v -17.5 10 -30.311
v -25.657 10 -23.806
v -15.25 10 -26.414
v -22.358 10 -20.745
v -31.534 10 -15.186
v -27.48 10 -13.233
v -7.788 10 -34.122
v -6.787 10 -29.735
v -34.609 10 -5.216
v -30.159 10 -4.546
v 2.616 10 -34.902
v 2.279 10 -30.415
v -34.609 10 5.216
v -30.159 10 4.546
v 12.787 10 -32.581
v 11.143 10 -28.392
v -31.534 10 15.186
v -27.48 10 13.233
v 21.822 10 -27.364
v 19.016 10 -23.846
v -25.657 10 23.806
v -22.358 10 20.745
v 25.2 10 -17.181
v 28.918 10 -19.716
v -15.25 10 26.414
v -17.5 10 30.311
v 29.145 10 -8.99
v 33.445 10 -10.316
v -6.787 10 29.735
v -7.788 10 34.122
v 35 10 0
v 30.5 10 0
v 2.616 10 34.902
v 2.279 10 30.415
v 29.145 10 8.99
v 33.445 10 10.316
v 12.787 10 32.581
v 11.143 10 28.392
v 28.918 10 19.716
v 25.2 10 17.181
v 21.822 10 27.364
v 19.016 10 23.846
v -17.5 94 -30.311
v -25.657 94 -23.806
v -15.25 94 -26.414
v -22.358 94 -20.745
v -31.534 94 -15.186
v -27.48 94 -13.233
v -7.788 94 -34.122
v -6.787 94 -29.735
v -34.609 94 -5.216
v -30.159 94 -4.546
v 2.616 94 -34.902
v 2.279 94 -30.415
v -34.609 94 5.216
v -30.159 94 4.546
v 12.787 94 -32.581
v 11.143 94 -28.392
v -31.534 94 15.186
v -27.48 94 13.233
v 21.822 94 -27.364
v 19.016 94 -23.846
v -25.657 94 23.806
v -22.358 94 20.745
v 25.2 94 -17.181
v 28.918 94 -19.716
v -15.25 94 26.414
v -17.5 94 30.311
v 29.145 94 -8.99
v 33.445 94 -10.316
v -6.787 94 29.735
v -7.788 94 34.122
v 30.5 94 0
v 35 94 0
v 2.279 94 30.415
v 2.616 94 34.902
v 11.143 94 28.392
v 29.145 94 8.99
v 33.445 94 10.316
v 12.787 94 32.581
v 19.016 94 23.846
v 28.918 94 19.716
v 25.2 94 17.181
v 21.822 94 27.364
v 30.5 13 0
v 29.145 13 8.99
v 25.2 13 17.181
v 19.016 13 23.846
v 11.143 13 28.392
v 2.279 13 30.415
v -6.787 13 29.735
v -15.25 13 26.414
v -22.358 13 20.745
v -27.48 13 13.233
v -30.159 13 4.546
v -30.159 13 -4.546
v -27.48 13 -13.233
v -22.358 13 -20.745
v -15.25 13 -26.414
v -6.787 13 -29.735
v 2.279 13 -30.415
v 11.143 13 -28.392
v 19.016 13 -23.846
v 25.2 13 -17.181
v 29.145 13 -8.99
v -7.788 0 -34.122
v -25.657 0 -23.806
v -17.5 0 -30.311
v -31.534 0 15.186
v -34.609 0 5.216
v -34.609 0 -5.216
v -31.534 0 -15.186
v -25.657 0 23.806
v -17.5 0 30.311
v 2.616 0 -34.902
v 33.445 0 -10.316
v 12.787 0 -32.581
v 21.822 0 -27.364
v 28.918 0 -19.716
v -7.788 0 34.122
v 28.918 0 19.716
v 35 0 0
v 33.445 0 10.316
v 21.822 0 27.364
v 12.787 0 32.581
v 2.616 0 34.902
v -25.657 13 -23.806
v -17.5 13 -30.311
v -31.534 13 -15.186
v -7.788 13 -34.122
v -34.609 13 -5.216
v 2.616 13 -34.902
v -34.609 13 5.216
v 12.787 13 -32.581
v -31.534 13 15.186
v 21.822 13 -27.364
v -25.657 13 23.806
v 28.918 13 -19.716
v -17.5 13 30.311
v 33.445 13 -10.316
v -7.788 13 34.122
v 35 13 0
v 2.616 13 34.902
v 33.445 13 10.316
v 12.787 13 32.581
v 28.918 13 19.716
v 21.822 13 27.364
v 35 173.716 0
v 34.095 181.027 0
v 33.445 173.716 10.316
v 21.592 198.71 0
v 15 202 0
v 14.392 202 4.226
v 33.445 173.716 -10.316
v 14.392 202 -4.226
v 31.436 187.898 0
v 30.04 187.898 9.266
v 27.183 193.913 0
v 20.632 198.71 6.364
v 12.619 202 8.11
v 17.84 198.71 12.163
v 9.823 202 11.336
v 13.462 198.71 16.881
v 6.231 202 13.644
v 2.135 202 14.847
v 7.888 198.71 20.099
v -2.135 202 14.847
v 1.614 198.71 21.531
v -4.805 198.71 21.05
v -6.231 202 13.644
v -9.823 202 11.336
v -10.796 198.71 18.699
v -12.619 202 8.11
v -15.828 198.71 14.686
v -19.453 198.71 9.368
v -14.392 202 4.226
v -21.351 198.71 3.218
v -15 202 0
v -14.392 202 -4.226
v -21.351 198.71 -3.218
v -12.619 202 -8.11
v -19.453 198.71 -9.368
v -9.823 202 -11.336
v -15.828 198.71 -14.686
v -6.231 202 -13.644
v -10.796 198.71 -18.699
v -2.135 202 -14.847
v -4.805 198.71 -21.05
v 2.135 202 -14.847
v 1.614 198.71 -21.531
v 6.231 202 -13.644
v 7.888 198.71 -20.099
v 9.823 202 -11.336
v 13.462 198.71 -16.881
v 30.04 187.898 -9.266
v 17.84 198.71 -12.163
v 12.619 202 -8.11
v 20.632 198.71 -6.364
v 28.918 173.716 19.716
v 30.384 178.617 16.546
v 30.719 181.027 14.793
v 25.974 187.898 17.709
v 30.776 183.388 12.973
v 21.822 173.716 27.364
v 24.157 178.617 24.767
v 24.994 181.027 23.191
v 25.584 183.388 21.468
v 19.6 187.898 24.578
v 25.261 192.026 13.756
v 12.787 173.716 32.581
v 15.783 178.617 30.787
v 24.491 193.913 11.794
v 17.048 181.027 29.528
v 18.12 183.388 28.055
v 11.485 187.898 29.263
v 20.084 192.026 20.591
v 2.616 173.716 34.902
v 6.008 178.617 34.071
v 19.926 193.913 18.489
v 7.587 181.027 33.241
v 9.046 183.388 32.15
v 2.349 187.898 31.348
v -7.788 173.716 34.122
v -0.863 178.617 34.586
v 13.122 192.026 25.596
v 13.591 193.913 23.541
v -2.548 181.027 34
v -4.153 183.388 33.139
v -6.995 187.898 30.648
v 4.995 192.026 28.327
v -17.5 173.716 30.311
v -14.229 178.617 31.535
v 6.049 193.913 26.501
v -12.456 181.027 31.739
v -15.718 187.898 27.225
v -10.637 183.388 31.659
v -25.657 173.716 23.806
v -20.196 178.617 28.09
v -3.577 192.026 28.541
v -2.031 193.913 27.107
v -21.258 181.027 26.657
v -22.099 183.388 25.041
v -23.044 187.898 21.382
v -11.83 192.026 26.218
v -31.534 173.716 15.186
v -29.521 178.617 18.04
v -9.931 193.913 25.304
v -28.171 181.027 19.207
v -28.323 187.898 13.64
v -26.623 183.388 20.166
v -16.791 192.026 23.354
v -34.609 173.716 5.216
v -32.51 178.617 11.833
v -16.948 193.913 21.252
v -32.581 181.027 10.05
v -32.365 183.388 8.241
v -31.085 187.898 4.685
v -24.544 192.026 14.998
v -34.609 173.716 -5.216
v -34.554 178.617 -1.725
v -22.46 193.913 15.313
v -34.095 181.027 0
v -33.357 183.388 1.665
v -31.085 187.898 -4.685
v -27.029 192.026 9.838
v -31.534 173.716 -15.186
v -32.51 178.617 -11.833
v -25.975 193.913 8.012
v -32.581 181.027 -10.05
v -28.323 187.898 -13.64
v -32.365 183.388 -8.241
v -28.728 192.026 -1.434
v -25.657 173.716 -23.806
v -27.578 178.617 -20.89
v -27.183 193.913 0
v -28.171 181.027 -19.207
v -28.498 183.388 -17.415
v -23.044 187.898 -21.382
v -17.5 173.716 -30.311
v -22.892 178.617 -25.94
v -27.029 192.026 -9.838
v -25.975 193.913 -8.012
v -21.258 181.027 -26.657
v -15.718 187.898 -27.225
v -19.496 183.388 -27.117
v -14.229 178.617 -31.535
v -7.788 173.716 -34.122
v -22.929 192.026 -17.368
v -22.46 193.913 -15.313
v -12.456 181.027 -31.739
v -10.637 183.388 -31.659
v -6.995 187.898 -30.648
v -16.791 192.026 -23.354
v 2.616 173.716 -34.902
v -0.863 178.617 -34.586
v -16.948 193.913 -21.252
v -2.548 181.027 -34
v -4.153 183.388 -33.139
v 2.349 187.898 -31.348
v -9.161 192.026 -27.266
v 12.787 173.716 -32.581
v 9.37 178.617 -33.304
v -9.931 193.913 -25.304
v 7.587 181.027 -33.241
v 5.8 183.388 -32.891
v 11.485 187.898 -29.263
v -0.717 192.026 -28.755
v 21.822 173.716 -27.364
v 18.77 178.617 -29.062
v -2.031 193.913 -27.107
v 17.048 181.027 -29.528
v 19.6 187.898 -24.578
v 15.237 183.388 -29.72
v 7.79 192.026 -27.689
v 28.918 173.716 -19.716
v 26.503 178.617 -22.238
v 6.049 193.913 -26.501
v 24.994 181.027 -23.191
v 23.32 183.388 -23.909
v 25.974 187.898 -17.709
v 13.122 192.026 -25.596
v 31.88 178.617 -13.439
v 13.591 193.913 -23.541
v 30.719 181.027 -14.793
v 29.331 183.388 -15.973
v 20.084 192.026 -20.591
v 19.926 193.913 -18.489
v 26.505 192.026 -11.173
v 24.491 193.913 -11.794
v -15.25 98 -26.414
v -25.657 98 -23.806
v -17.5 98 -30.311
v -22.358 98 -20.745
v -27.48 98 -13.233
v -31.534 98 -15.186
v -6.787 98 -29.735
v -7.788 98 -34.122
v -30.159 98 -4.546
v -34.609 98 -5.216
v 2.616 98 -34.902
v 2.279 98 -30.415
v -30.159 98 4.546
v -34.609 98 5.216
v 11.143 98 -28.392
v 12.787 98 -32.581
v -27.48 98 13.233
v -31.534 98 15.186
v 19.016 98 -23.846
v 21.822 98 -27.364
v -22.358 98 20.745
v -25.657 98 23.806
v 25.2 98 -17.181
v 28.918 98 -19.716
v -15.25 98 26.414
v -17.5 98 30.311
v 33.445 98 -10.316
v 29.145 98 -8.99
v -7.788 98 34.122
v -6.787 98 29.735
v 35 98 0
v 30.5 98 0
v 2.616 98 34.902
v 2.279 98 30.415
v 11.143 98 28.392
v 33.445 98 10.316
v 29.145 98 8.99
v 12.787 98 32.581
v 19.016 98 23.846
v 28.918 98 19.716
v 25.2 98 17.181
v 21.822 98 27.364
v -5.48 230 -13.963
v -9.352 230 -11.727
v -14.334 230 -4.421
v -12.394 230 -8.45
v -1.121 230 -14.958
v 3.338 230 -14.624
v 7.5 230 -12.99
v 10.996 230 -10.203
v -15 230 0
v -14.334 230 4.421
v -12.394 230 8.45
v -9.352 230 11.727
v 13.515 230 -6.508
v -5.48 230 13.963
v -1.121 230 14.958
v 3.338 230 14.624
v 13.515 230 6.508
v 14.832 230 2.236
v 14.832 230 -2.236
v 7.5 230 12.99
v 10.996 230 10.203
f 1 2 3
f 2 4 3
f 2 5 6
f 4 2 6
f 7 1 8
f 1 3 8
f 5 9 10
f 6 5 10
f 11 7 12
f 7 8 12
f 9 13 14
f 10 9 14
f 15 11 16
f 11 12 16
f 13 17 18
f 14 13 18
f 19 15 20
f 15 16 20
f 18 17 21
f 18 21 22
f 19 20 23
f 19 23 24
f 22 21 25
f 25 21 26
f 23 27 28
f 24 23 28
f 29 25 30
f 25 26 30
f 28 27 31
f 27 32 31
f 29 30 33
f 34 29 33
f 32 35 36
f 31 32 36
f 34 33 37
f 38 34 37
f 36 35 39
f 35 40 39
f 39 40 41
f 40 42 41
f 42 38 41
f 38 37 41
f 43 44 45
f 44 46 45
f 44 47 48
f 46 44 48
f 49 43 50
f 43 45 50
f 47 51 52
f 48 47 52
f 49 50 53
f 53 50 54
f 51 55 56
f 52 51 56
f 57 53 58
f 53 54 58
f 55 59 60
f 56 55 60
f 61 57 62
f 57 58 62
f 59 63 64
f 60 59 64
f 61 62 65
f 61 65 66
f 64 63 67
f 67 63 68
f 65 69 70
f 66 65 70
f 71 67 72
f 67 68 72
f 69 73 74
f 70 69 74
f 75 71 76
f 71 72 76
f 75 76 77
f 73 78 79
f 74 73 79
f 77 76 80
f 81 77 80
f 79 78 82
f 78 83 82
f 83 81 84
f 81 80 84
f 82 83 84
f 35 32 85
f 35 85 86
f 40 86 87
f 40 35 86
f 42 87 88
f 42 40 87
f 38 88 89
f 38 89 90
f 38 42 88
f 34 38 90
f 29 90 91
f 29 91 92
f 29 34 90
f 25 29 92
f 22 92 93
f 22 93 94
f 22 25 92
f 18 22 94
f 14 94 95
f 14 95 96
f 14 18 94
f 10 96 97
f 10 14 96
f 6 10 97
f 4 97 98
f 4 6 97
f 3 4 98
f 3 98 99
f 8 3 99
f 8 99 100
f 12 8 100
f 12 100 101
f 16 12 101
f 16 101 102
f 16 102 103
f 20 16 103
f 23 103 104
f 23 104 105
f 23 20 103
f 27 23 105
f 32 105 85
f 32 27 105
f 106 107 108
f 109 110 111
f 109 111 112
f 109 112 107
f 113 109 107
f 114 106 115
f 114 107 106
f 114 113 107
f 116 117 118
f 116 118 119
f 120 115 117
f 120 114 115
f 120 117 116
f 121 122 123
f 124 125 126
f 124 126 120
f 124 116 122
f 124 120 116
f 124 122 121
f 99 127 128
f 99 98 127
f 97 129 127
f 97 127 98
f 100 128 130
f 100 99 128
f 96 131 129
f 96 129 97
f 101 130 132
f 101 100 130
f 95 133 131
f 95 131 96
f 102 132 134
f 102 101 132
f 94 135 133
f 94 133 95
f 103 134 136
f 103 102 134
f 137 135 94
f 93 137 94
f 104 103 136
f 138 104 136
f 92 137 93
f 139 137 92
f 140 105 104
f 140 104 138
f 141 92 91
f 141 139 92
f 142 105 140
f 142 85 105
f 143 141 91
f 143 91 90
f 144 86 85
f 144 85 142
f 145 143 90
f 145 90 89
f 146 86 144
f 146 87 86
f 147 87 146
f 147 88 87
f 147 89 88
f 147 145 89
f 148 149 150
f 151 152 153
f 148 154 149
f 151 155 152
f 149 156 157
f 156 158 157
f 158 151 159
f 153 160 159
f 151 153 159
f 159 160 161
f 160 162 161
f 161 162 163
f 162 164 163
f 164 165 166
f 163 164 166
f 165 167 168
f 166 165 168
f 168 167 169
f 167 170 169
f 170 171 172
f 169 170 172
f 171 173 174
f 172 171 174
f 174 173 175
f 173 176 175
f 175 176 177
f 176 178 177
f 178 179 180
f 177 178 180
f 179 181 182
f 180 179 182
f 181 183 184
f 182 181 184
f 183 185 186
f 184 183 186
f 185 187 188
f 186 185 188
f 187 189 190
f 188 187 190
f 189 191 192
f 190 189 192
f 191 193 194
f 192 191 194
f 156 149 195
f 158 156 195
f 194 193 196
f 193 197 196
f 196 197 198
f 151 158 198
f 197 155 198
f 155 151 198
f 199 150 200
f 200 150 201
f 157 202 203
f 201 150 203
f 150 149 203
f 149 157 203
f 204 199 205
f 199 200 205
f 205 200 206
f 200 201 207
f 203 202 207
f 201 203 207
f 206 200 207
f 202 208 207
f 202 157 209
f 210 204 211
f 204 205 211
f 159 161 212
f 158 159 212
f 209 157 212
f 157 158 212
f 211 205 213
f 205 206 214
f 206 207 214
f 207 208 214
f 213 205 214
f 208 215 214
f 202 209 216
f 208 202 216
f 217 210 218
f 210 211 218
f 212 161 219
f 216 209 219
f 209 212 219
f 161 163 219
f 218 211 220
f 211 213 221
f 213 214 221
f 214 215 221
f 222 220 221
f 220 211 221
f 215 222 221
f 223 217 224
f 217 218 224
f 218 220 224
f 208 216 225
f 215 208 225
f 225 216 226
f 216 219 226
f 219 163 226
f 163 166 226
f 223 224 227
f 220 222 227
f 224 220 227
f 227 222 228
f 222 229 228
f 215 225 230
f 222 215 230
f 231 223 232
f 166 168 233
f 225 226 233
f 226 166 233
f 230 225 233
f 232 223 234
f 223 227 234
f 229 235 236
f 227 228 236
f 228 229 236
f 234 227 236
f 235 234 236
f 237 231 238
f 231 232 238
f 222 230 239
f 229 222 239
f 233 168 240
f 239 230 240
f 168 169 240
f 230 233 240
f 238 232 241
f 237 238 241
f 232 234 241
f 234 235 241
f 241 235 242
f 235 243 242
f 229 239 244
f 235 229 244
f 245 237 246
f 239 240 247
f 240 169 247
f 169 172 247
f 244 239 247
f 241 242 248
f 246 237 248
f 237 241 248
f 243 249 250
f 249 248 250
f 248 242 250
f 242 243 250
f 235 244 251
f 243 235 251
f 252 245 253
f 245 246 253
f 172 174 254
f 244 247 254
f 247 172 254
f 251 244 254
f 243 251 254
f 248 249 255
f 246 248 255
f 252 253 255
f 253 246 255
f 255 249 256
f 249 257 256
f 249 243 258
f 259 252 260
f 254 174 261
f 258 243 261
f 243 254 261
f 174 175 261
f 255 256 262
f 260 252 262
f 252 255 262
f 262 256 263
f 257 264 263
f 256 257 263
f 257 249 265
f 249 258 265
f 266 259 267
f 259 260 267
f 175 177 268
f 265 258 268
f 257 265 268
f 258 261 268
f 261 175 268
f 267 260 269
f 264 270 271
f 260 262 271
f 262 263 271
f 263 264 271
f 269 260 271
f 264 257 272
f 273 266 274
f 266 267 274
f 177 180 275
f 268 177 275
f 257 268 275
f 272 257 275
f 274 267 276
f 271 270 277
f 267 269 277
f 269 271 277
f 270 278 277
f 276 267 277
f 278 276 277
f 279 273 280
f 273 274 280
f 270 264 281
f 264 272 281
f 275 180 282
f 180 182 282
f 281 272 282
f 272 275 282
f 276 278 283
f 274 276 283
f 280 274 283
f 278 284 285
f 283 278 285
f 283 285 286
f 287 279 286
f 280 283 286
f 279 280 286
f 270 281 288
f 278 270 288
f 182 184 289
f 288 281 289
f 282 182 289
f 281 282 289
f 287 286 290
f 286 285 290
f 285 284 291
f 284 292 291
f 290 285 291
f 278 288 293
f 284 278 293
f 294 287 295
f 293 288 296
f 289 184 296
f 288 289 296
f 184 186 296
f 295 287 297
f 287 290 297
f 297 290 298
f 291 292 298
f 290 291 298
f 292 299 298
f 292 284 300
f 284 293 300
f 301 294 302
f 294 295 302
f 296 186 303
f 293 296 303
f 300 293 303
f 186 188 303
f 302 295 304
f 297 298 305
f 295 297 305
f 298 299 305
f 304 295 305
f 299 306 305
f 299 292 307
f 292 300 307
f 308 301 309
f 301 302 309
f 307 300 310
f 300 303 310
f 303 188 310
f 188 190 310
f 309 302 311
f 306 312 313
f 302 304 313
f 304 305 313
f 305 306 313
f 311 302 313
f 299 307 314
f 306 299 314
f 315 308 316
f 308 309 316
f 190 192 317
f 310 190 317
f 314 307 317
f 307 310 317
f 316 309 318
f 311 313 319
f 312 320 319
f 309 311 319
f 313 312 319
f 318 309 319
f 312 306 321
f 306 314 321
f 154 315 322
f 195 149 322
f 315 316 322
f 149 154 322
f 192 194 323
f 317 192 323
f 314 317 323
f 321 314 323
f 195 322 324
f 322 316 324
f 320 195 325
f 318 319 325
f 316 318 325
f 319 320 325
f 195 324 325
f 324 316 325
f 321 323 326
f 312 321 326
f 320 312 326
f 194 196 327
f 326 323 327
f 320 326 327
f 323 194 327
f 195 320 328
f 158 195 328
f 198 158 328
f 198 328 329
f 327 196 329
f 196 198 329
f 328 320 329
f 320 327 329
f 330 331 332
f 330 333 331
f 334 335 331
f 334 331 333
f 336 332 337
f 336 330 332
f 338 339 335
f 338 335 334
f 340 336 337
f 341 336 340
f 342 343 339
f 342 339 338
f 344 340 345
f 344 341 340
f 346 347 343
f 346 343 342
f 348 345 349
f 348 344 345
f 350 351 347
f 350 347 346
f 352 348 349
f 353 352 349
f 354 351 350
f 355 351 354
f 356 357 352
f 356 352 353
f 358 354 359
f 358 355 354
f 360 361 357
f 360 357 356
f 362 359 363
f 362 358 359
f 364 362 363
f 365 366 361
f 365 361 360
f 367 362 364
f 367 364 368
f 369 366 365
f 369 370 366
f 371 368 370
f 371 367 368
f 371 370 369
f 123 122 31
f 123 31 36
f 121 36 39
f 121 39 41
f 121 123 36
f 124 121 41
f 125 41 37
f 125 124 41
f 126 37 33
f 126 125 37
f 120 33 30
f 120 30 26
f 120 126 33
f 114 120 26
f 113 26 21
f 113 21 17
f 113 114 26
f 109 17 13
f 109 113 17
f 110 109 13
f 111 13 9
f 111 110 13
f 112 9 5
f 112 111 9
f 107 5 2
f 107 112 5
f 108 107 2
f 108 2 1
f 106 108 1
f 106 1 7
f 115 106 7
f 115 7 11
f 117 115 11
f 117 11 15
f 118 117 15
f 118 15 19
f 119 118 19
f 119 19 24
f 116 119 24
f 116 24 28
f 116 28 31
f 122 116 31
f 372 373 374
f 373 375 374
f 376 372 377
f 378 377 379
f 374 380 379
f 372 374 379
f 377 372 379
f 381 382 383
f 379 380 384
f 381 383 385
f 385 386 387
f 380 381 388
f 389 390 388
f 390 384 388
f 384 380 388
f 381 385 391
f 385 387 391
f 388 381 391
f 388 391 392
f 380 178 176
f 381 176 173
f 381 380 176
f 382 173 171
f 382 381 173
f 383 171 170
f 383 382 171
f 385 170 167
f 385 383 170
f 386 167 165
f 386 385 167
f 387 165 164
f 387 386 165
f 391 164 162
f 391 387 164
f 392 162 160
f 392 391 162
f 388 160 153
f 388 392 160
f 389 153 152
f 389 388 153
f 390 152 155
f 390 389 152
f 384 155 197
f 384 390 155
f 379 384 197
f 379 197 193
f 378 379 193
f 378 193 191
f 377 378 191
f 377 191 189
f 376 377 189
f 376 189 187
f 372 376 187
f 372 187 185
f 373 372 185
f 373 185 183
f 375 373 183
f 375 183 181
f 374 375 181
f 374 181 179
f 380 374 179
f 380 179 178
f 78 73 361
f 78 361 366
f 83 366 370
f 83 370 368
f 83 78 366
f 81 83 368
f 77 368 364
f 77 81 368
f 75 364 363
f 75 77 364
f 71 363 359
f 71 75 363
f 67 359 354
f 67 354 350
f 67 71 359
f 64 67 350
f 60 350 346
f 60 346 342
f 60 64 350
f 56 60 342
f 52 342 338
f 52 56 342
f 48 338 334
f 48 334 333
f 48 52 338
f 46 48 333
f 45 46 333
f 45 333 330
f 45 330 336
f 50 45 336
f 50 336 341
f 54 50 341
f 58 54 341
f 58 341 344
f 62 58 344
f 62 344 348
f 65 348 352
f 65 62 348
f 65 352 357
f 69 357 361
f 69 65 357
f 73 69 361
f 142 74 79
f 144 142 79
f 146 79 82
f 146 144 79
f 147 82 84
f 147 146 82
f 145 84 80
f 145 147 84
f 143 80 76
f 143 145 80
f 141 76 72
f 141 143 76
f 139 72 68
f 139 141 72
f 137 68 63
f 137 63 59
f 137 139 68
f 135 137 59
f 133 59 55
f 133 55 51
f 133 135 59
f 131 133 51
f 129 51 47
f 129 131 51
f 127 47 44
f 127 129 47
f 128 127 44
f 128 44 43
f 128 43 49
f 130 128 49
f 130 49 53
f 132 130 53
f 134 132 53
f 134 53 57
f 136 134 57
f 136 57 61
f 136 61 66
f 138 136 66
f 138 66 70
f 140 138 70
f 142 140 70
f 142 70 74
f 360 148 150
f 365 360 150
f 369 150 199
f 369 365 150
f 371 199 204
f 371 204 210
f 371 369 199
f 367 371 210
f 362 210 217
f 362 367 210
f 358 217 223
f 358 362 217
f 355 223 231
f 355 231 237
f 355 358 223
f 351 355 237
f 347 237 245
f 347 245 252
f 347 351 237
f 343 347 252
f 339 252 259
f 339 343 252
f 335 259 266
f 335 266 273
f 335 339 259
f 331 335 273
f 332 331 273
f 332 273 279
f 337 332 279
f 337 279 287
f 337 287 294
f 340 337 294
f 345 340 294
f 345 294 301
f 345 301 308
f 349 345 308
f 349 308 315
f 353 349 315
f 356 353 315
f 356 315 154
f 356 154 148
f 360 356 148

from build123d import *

# Parameters (mm, degrees)
F0_R     = 35
F1_DEPTH = 230
F3_R     = 40.5
F3_R_2   = 30.5
F4_DEPTH = 3
F6_R     = 40
F6_R_2   = 30.5
F7_DEPTH = 4
F8_R     = 40
F8_R_2   = 15
F9_DEPTH = 28


# Not quite as in the source:
# - a fillet or chamfer that OpenCascade refuses, or shapes differently, is made with other operations: its cross-section is extruded or revolved along the edge and cut away or added


with BuildPart() as f1:
    # F0 (on Front) → F1 (new body)
    with BuildSketch(Plane.XZ):
        Circle(F0_R)
    extrude(amount=-F1_DEPTH)

    # F3 (on offset) → F4 (cut)
    with BuildSketch(Plane.XZ.offset(-10)):
        Circle(F3_R)
        Circle(F3_R_2, mode=Mode.SUBTRACT)
    extrude(amount=-F4_DEPTH, mode=Mode.SUBTRACT)

    # F6 (on offset) → F7 (cut)
    with BuildSketch(Plane.XZ.offset(-94)):
        Circle(F6_R)
        Circle(F6_R_2, mode=Mode.SUBTRACT)
    extrude(amount=-F7_DEPTH, mode=Mode.SUBTRACT)

    # F8 (on face) → F9 (cut)
    with BuildSketch(Plane(origin=(0, 230, 0), x_dir=(-1, 0, 0), z_dir=(0, 1, 0))):
        Circle(F8_R)
        Circle(F8_R_2, mode=Mode.SUBTRACT)
    extrude(amount=-F9_DEPTH, mode=Mode.SUBTRACT)

    # F10: fillet of radius 30 on 1 edges, made by hand

    # F10_s1 → F10_t2 (revolve, cut)
    with BuildSketch(Plane.XY):
        with BuildLine():
            ThreePointArc((35, 173.7157287525), (29.4948974278, 191.0362368282), (15, 202))
            Line((15, 202), (35, 202))
            Line((35, 202), (35, 173.7157287525))
        make_face()
    revolve(axis=Axis((0, 202, 0), (0, -1, 0)), mode=Mode.SUBTRACT)


solid = f1.part
